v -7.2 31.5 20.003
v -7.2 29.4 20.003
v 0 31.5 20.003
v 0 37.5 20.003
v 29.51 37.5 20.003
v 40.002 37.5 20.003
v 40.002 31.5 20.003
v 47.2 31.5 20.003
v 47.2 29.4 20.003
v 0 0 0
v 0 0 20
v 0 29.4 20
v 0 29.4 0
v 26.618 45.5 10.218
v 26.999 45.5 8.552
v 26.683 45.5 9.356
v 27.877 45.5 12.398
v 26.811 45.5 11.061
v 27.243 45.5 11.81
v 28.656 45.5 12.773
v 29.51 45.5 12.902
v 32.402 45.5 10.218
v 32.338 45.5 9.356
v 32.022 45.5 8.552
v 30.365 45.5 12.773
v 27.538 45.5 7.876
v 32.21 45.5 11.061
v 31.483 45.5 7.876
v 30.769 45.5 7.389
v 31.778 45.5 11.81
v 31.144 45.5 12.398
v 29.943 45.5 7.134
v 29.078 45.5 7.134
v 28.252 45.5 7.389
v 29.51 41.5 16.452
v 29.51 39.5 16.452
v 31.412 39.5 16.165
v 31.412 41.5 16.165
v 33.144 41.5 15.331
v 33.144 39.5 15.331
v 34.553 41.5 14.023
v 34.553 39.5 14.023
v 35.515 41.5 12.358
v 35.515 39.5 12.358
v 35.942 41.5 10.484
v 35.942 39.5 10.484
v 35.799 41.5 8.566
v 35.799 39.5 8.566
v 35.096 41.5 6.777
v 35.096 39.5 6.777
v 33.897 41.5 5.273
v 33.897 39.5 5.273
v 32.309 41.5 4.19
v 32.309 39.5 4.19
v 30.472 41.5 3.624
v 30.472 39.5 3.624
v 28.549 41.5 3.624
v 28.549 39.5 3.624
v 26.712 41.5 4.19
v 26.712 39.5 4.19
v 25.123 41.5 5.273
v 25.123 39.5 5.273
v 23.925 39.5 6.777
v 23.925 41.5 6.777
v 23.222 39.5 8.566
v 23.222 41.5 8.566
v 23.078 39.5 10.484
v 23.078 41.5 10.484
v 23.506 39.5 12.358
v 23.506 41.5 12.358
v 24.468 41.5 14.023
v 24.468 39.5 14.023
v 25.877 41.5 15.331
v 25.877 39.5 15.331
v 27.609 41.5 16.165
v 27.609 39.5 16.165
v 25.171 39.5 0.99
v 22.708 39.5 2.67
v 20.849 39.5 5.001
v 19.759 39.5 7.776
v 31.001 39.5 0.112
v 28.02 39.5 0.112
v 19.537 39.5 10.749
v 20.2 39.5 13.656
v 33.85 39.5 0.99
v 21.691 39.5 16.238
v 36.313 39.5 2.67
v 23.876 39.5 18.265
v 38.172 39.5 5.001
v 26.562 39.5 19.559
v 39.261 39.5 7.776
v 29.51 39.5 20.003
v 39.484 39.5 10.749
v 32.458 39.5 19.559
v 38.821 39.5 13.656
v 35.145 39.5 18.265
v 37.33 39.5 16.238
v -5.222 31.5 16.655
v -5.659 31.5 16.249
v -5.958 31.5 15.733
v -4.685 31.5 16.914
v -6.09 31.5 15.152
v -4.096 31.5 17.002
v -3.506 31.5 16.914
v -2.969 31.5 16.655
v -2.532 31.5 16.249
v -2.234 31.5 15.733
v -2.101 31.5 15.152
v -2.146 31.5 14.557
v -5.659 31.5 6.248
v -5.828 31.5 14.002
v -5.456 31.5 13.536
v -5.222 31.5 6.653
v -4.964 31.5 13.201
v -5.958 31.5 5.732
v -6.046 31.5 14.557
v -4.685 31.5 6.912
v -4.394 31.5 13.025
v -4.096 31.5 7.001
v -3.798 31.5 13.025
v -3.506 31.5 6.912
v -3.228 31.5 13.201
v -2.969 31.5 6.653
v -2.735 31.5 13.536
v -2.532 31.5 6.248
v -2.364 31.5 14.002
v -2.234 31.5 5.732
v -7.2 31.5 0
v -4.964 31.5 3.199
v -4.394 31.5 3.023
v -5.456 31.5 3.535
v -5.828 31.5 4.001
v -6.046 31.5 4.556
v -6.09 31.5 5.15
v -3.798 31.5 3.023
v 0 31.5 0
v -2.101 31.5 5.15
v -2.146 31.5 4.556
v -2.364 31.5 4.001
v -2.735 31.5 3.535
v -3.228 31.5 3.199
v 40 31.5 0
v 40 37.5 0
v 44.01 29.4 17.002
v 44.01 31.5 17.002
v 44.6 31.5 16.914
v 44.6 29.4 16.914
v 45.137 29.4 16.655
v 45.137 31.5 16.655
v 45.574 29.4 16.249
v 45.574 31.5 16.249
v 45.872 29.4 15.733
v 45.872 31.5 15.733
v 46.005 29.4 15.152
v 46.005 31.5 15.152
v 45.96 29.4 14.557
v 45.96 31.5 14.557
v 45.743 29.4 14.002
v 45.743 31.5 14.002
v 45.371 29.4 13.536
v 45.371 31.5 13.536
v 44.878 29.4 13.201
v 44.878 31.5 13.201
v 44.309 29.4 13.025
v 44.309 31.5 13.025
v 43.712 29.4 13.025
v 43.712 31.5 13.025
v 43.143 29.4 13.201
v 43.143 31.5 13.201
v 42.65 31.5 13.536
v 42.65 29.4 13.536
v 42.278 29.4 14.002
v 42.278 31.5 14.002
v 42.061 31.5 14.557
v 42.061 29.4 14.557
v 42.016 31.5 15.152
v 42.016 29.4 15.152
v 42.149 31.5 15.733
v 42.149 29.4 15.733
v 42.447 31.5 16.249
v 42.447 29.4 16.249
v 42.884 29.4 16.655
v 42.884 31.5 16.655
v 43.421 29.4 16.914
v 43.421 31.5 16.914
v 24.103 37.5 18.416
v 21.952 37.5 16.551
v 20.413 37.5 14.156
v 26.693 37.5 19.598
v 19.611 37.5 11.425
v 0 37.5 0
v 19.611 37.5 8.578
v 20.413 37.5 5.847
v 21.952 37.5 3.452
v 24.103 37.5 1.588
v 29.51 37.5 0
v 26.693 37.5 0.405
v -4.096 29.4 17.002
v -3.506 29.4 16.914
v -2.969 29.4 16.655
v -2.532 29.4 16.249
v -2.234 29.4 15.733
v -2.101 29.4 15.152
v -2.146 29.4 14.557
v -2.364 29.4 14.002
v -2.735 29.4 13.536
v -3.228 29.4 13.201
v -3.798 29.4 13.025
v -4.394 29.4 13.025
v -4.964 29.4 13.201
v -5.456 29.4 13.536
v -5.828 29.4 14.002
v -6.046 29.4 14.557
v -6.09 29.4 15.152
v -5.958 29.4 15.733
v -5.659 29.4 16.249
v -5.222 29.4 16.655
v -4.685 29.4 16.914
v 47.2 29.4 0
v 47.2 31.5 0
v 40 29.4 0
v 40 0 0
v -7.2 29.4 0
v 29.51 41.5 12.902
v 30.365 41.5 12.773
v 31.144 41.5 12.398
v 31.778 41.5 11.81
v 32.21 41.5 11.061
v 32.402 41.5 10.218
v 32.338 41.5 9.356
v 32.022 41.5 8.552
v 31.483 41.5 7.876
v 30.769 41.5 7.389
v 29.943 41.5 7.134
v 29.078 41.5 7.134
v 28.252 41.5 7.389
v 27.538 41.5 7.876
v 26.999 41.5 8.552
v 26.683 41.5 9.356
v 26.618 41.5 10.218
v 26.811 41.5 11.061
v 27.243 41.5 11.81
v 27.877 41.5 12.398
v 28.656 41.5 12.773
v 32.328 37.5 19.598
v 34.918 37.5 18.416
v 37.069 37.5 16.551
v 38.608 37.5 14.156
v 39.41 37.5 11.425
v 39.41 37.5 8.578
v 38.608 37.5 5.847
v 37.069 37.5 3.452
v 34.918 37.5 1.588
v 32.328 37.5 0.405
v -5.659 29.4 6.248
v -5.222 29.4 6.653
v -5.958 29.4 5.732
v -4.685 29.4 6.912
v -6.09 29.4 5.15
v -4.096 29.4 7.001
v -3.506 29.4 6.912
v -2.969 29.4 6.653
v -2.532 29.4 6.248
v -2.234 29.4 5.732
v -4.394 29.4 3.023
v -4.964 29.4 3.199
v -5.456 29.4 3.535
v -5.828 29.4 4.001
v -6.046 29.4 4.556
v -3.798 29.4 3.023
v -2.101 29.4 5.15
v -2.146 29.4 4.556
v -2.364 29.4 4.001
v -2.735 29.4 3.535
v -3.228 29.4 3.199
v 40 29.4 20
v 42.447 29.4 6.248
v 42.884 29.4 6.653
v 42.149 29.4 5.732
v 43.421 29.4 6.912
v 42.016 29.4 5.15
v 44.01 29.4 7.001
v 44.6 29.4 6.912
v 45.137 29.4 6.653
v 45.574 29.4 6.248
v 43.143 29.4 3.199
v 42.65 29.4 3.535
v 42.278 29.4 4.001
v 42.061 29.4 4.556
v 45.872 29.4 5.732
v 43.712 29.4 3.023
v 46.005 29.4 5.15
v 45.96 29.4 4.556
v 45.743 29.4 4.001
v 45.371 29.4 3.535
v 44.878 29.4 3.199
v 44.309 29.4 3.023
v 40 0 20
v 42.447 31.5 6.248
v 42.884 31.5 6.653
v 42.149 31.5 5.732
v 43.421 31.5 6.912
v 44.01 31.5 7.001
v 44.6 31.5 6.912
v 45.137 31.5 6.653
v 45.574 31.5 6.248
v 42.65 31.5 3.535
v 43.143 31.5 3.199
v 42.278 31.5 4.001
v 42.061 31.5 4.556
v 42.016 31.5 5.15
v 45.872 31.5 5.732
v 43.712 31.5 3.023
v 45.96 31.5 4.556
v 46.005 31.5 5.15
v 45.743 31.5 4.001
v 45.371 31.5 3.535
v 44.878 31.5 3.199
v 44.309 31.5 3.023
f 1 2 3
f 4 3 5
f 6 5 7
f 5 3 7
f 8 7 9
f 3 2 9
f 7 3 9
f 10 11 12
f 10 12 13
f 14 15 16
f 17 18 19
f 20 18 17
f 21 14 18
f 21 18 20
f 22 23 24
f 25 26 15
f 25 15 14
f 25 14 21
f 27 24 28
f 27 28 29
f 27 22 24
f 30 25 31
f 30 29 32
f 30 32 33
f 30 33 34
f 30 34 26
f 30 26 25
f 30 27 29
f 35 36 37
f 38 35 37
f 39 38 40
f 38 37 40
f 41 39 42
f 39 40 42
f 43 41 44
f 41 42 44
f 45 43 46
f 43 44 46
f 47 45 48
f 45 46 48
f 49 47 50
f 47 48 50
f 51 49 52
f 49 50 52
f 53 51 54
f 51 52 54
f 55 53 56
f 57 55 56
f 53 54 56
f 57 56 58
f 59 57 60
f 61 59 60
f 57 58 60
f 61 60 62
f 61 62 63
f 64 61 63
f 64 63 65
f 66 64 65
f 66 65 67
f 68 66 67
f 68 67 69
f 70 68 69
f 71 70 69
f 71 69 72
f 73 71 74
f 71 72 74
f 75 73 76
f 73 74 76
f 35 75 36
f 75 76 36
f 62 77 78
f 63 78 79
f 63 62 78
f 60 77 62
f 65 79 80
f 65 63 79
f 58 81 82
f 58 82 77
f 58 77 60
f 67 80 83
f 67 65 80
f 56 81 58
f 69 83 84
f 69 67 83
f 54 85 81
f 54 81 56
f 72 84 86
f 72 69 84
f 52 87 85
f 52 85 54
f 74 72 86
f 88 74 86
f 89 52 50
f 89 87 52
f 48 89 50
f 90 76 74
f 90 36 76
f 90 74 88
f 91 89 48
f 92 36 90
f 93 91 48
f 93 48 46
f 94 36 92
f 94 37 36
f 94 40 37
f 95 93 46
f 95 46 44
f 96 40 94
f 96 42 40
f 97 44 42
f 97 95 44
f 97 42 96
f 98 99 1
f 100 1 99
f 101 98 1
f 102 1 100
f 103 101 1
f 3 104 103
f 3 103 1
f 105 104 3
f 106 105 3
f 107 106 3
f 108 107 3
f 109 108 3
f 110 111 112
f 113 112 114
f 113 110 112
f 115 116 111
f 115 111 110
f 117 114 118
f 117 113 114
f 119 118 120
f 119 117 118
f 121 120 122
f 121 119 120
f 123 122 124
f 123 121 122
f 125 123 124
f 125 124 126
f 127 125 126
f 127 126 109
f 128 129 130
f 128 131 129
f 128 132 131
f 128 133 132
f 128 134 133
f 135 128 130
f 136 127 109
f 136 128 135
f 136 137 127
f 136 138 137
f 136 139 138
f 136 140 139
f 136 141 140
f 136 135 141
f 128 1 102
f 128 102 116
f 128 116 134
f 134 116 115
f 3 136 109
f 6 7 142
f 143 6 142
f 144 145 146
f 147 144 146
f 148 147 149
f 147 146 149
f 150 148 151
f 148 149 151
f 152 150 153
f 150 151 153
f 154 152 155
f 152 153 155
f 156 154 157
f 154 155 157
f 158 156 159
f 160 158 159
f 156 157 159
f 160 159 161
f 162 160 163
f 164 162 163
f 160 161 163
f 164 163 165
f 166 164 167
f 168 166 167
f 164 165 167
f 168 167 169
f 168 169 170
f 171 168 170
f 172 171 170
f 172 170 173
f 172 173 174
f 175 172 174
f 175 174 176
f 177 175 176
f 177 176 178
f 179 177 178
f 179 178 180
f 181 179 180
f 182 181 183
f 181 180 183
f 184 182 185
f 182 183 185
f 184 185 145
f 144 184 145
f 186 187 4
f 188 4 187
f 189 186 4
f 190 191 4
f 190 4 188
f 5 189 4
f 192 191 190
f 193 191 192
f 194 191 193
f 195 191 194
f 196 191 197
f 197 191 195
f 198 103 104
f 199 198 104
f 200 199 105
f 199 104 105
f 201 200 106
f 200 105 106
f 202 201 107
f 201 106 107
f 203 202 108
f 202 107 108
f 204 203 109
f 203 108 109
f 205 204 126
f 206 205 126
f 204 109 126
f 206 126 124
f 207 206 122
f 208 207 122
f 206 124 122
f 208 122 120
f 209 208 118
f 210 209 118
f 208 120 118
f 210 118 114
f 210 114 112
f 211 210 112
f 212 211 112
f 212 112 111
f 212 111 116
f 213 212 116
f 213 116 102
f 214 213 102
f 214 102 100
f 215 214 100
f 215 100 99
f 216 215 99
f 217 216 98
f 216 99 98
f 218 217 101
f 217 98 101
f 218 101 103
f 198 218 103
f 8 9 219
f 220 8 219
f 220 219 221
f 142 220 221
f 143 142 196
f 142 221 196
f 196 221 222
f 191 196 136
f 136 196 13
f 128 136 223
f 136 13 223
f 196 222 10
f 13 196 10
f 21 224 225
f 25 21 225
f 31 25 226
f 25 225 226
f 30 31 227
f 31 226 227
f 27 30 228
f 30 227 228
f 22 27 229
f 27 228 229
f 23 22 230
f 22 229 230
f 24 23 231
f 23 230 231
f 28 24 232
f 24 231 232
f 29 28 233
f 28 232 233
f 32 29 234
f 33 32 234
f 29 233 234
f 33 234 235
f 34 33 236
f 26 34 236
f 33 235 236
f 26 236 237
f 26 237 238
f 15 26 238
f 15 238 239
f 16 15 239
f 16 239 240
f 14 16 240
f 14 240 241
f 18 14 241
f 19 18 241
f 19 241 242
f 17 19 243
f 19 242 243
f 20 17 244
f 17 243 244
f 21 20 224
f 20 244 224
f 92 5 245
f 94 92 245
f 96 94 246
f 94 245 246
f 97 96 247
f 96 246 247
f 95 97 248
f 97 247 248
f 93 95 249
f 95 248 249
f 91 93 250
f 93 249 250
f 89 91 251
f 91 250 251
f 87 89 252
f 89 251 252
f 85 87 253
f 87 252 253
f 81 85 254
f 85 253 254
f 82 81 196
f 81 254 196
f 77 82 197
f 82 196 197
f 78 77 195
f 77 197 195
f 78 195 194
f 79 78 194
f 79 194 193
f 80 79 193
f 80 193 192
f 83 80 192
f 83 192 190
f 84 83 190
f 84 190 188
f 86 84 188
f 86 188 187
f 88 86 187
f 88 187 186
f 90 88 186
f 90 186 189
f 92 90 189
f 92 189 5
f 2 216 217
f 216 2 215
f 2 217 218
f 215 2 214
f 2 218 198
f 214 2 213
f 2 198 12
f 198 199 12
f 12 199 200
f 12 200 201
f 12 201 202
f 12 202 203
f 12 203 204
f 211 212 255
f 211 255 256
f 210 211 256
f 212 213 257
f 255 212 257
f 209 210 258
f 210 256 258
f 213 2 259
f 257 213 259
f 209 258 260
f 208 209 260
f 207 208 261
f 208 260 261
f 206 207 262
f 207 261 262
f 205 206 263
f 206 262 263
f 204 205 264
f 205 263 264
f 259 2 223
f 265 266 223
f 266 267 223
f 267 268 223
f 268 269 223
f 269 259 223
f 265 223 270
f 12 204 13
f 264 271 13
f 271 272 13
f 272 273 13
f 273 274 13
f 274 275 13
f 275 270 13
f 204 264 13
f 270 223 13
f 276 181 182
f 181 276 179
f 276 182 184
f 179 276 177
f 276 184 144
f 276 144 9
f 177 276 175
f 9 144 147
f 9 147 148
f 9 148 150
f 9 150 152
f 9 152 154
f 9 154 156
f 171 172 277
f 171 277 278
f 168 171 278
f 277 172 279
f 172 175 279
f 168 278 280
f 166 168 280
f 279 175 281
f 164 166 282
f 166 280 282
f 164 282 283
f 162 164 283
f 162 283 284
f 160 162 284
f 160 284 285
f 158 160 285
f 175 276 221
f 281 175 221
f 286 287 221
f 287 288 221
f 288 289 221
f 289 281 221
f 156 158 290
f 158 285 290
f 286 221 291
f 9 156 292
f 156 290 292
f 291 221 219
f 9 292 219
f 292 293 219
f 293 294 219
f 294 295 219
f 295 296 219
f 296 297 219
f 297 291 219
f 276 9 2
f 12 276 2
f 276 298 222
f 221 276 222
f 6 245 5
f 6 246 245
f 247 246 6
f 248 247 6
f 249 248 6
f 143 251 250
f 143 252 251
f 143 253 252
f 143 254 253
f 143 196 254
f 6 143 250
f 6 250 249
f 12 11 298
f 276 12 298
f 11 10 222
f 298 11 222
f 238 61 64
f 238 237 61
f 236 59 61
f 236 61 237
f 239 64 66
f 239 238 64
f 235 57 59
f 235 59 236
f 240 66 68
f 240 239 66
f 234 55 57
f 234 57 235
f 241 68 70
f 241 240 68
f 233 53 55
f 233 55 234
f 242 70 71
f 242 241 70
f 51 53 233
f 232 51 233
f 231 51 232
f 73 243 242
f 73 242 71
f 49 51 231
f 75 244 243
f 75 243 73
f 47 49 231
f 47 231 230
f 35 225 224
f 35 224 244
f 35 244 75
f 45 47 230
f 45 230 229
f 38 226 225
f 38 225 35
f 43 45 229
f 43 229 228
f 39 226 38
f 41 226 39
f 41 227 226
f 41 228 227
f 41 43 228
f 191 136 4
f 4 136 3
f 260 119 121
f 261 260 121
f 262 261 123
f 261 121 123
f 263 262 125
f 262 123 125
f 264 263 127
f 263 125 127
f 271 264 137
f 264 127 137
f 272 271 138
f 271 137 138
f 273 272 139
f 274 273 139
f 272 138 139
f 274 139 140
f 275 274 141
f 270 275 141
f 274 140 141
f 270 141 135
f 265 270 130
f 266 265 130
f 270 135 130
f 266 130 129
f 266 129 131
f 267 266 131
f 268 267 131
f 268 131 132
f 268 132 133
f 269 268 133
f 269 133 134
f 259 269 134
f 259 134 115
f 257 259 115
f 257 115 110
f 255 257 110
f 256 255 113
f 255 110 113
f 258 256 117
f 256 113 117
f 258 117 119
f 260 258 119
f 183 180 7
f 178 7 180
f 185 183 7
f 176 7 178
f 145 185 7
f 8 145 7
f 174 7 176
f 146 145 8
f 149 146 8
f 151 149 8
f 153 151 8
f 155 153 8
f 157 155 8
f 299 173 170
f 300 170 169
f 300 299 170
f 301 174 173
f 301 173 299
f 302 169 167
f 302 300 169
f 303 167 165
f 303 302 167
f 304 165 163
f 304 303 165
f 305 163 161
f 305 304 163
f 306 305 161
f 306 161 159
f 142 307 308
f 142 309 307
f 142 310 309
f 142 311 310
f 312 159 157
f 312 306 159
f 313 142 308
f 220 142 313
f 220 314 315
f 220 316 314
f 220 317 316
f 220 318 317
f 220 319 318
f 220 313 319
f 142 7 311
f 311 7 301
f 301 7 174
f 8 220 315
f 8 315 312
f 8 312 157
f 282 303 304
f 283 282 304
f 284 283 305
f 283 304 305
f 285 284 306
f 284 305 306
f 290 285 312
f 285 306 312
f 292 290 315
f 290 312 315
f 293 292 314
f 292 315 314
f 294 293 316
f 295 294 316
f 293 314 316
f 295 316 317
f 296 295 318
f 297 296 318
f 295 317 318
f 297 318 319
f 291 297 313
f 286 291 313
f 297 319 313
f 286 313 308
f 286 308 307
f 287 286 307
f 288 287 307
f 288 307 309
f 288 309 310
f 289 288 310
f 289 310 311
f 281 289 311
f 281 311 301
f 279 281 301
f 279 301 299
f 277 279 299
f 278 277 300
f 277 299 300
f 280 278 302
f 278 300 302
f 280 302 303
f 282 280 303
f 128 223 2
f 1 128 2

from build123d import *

# Parameters (mm, degrees)
CROQUIS1_W              = 40
CROQUIS1_H              = 20
SALIENTE_EXTRUIR1_DEPTH = 29.4
SALIENTE_EXTRUIR2_DEPTH = 2.1
CROQUIS3_R              = 2
CORTAR_EXTRUIR1_DEPTH   = 2.1
SALIENTE_EXTRUIR3_DEPTH = 6
CROQUIS5_R              = 10.001656383
SALIENTE_EXTRUIR4_DEPTH = 2
CROQUIS6_R              = 6.45
SALIENTE_EXTRUIR5_DEPTH = 2
CROQUIS7_R              = 2.9
SALIENTE_EXTRUIR6_DEPTH = 4


with BuildPart() as part:
    # Croquis1 → Saliente-Extruir1 (new body)
    with BuildSketch(Plane(origin=(0, 0, 0), x_dir=(1, 0, 0), z_dir=(0, 1, 0))):
        with Locations((20, -10)):
            Rectangle(CROQUIS1_W, CROQUIS1_H)
    extrude(amount=SALIENTE_EXTRUIR1_DEPTH)

    # Croquis2 → Saliente-Extruir2 (add)
    with BuildSketch(Plane(origin=(0, 29.4, 0), x_dir=(1, 0, 0), z_dir=(0, 1, 0))):
        Polygon((20, 0), (-7.2, 0), (-7.2, -20.003312767), (47.2, -20.003312767), (47.2, 0), align=None)
    extrude(amount=SALIENTE_EXTRUIR2_DEPTH)

    # Croquis3 → Cortar-Extruir1 (cut)
    with BuildSketch(Plane(origin=(0, 31.5, 0), x_dir=(1, 0, 0), z_dir=(0, 1, 0))):
        with Locations(Location((-4.095776159, -5.000828192, 0), (0, 0, 270))):
            Circle(CROQUIS3_R)
        with Locations(Location((-4.095776159, -15.002484575, 0), (0, 0, 270))):
            Circle(CROQUIS3_R)
        with Locations(Location((44.010481376, -5.000828192, 0), (0, 0, 270))):
            Circle(CROQUIS3_R)
        with Locations(Location((44.010481376, -15.002484575, 0), (0, 0, 270))):
            Circle(CROQUIS3_R)
    extrude(amount=-CORTAR_EXTRUIR1_DEPTH, mode=Mode.SUBTRACT)

    # Croquis4 → Saliente-Extruir3 (add)
    with BuildSketch(Plane(origin=(0, 31.5, 0), x_dir=(1, 0, 0), z_dir=(0, 1, 0))):
        Polygon((0, 0), (0, -20.003312767), (40.001626581, -20.003312767), (40, 0), align=None)
    extrude(amount=SALIENTE_EXTRUIR3_DEPTH)

    # Croquis5 → Saliente-Extruir4 (add)
    with BuildSketch(Plane(origin=(0, 37.5, 0), x_dir=(1, 0, 0), z_dir=(0, 1, 0))):
        with Locations(Location((29.510368289, -10.001656383, 0), (0, 0, 270))):
            Circle(CROQUIS5_R)
    extrude(amount=SALIENTE_EXTRUIR4_DEPTH)

    # Croquis6 → Saliente-Extruir5 (add)
    with BuildSketch(Plane(origin=(0, 39.5, 0), x_dir=(1, 0, 0), z_dir=(0, 1, 0))):
        with Locations(Location((29.510368289, -10.001656383, 0), (0, 0, 270))):
            Circle(CROQUIS6_R)
    extrude(amount=SALIENTE_EXTRUIR5_DEPTH)

    # Croquis7 → Saliente-Extruir6 (add)
    with BuildSketch(Plane(origin=(0, 41.5, 0), x_dir=(1, 0, 0), z_dir=(0, 1, 0))):
        with Locations(Location((29.510368289, -10.001656383, 0), (0, 0, 270))):
            Circle(CROQUIS7_R)
    extrude(amount=SALIENTE_EXTRUIR6_DEPTH)


solid = part.part
